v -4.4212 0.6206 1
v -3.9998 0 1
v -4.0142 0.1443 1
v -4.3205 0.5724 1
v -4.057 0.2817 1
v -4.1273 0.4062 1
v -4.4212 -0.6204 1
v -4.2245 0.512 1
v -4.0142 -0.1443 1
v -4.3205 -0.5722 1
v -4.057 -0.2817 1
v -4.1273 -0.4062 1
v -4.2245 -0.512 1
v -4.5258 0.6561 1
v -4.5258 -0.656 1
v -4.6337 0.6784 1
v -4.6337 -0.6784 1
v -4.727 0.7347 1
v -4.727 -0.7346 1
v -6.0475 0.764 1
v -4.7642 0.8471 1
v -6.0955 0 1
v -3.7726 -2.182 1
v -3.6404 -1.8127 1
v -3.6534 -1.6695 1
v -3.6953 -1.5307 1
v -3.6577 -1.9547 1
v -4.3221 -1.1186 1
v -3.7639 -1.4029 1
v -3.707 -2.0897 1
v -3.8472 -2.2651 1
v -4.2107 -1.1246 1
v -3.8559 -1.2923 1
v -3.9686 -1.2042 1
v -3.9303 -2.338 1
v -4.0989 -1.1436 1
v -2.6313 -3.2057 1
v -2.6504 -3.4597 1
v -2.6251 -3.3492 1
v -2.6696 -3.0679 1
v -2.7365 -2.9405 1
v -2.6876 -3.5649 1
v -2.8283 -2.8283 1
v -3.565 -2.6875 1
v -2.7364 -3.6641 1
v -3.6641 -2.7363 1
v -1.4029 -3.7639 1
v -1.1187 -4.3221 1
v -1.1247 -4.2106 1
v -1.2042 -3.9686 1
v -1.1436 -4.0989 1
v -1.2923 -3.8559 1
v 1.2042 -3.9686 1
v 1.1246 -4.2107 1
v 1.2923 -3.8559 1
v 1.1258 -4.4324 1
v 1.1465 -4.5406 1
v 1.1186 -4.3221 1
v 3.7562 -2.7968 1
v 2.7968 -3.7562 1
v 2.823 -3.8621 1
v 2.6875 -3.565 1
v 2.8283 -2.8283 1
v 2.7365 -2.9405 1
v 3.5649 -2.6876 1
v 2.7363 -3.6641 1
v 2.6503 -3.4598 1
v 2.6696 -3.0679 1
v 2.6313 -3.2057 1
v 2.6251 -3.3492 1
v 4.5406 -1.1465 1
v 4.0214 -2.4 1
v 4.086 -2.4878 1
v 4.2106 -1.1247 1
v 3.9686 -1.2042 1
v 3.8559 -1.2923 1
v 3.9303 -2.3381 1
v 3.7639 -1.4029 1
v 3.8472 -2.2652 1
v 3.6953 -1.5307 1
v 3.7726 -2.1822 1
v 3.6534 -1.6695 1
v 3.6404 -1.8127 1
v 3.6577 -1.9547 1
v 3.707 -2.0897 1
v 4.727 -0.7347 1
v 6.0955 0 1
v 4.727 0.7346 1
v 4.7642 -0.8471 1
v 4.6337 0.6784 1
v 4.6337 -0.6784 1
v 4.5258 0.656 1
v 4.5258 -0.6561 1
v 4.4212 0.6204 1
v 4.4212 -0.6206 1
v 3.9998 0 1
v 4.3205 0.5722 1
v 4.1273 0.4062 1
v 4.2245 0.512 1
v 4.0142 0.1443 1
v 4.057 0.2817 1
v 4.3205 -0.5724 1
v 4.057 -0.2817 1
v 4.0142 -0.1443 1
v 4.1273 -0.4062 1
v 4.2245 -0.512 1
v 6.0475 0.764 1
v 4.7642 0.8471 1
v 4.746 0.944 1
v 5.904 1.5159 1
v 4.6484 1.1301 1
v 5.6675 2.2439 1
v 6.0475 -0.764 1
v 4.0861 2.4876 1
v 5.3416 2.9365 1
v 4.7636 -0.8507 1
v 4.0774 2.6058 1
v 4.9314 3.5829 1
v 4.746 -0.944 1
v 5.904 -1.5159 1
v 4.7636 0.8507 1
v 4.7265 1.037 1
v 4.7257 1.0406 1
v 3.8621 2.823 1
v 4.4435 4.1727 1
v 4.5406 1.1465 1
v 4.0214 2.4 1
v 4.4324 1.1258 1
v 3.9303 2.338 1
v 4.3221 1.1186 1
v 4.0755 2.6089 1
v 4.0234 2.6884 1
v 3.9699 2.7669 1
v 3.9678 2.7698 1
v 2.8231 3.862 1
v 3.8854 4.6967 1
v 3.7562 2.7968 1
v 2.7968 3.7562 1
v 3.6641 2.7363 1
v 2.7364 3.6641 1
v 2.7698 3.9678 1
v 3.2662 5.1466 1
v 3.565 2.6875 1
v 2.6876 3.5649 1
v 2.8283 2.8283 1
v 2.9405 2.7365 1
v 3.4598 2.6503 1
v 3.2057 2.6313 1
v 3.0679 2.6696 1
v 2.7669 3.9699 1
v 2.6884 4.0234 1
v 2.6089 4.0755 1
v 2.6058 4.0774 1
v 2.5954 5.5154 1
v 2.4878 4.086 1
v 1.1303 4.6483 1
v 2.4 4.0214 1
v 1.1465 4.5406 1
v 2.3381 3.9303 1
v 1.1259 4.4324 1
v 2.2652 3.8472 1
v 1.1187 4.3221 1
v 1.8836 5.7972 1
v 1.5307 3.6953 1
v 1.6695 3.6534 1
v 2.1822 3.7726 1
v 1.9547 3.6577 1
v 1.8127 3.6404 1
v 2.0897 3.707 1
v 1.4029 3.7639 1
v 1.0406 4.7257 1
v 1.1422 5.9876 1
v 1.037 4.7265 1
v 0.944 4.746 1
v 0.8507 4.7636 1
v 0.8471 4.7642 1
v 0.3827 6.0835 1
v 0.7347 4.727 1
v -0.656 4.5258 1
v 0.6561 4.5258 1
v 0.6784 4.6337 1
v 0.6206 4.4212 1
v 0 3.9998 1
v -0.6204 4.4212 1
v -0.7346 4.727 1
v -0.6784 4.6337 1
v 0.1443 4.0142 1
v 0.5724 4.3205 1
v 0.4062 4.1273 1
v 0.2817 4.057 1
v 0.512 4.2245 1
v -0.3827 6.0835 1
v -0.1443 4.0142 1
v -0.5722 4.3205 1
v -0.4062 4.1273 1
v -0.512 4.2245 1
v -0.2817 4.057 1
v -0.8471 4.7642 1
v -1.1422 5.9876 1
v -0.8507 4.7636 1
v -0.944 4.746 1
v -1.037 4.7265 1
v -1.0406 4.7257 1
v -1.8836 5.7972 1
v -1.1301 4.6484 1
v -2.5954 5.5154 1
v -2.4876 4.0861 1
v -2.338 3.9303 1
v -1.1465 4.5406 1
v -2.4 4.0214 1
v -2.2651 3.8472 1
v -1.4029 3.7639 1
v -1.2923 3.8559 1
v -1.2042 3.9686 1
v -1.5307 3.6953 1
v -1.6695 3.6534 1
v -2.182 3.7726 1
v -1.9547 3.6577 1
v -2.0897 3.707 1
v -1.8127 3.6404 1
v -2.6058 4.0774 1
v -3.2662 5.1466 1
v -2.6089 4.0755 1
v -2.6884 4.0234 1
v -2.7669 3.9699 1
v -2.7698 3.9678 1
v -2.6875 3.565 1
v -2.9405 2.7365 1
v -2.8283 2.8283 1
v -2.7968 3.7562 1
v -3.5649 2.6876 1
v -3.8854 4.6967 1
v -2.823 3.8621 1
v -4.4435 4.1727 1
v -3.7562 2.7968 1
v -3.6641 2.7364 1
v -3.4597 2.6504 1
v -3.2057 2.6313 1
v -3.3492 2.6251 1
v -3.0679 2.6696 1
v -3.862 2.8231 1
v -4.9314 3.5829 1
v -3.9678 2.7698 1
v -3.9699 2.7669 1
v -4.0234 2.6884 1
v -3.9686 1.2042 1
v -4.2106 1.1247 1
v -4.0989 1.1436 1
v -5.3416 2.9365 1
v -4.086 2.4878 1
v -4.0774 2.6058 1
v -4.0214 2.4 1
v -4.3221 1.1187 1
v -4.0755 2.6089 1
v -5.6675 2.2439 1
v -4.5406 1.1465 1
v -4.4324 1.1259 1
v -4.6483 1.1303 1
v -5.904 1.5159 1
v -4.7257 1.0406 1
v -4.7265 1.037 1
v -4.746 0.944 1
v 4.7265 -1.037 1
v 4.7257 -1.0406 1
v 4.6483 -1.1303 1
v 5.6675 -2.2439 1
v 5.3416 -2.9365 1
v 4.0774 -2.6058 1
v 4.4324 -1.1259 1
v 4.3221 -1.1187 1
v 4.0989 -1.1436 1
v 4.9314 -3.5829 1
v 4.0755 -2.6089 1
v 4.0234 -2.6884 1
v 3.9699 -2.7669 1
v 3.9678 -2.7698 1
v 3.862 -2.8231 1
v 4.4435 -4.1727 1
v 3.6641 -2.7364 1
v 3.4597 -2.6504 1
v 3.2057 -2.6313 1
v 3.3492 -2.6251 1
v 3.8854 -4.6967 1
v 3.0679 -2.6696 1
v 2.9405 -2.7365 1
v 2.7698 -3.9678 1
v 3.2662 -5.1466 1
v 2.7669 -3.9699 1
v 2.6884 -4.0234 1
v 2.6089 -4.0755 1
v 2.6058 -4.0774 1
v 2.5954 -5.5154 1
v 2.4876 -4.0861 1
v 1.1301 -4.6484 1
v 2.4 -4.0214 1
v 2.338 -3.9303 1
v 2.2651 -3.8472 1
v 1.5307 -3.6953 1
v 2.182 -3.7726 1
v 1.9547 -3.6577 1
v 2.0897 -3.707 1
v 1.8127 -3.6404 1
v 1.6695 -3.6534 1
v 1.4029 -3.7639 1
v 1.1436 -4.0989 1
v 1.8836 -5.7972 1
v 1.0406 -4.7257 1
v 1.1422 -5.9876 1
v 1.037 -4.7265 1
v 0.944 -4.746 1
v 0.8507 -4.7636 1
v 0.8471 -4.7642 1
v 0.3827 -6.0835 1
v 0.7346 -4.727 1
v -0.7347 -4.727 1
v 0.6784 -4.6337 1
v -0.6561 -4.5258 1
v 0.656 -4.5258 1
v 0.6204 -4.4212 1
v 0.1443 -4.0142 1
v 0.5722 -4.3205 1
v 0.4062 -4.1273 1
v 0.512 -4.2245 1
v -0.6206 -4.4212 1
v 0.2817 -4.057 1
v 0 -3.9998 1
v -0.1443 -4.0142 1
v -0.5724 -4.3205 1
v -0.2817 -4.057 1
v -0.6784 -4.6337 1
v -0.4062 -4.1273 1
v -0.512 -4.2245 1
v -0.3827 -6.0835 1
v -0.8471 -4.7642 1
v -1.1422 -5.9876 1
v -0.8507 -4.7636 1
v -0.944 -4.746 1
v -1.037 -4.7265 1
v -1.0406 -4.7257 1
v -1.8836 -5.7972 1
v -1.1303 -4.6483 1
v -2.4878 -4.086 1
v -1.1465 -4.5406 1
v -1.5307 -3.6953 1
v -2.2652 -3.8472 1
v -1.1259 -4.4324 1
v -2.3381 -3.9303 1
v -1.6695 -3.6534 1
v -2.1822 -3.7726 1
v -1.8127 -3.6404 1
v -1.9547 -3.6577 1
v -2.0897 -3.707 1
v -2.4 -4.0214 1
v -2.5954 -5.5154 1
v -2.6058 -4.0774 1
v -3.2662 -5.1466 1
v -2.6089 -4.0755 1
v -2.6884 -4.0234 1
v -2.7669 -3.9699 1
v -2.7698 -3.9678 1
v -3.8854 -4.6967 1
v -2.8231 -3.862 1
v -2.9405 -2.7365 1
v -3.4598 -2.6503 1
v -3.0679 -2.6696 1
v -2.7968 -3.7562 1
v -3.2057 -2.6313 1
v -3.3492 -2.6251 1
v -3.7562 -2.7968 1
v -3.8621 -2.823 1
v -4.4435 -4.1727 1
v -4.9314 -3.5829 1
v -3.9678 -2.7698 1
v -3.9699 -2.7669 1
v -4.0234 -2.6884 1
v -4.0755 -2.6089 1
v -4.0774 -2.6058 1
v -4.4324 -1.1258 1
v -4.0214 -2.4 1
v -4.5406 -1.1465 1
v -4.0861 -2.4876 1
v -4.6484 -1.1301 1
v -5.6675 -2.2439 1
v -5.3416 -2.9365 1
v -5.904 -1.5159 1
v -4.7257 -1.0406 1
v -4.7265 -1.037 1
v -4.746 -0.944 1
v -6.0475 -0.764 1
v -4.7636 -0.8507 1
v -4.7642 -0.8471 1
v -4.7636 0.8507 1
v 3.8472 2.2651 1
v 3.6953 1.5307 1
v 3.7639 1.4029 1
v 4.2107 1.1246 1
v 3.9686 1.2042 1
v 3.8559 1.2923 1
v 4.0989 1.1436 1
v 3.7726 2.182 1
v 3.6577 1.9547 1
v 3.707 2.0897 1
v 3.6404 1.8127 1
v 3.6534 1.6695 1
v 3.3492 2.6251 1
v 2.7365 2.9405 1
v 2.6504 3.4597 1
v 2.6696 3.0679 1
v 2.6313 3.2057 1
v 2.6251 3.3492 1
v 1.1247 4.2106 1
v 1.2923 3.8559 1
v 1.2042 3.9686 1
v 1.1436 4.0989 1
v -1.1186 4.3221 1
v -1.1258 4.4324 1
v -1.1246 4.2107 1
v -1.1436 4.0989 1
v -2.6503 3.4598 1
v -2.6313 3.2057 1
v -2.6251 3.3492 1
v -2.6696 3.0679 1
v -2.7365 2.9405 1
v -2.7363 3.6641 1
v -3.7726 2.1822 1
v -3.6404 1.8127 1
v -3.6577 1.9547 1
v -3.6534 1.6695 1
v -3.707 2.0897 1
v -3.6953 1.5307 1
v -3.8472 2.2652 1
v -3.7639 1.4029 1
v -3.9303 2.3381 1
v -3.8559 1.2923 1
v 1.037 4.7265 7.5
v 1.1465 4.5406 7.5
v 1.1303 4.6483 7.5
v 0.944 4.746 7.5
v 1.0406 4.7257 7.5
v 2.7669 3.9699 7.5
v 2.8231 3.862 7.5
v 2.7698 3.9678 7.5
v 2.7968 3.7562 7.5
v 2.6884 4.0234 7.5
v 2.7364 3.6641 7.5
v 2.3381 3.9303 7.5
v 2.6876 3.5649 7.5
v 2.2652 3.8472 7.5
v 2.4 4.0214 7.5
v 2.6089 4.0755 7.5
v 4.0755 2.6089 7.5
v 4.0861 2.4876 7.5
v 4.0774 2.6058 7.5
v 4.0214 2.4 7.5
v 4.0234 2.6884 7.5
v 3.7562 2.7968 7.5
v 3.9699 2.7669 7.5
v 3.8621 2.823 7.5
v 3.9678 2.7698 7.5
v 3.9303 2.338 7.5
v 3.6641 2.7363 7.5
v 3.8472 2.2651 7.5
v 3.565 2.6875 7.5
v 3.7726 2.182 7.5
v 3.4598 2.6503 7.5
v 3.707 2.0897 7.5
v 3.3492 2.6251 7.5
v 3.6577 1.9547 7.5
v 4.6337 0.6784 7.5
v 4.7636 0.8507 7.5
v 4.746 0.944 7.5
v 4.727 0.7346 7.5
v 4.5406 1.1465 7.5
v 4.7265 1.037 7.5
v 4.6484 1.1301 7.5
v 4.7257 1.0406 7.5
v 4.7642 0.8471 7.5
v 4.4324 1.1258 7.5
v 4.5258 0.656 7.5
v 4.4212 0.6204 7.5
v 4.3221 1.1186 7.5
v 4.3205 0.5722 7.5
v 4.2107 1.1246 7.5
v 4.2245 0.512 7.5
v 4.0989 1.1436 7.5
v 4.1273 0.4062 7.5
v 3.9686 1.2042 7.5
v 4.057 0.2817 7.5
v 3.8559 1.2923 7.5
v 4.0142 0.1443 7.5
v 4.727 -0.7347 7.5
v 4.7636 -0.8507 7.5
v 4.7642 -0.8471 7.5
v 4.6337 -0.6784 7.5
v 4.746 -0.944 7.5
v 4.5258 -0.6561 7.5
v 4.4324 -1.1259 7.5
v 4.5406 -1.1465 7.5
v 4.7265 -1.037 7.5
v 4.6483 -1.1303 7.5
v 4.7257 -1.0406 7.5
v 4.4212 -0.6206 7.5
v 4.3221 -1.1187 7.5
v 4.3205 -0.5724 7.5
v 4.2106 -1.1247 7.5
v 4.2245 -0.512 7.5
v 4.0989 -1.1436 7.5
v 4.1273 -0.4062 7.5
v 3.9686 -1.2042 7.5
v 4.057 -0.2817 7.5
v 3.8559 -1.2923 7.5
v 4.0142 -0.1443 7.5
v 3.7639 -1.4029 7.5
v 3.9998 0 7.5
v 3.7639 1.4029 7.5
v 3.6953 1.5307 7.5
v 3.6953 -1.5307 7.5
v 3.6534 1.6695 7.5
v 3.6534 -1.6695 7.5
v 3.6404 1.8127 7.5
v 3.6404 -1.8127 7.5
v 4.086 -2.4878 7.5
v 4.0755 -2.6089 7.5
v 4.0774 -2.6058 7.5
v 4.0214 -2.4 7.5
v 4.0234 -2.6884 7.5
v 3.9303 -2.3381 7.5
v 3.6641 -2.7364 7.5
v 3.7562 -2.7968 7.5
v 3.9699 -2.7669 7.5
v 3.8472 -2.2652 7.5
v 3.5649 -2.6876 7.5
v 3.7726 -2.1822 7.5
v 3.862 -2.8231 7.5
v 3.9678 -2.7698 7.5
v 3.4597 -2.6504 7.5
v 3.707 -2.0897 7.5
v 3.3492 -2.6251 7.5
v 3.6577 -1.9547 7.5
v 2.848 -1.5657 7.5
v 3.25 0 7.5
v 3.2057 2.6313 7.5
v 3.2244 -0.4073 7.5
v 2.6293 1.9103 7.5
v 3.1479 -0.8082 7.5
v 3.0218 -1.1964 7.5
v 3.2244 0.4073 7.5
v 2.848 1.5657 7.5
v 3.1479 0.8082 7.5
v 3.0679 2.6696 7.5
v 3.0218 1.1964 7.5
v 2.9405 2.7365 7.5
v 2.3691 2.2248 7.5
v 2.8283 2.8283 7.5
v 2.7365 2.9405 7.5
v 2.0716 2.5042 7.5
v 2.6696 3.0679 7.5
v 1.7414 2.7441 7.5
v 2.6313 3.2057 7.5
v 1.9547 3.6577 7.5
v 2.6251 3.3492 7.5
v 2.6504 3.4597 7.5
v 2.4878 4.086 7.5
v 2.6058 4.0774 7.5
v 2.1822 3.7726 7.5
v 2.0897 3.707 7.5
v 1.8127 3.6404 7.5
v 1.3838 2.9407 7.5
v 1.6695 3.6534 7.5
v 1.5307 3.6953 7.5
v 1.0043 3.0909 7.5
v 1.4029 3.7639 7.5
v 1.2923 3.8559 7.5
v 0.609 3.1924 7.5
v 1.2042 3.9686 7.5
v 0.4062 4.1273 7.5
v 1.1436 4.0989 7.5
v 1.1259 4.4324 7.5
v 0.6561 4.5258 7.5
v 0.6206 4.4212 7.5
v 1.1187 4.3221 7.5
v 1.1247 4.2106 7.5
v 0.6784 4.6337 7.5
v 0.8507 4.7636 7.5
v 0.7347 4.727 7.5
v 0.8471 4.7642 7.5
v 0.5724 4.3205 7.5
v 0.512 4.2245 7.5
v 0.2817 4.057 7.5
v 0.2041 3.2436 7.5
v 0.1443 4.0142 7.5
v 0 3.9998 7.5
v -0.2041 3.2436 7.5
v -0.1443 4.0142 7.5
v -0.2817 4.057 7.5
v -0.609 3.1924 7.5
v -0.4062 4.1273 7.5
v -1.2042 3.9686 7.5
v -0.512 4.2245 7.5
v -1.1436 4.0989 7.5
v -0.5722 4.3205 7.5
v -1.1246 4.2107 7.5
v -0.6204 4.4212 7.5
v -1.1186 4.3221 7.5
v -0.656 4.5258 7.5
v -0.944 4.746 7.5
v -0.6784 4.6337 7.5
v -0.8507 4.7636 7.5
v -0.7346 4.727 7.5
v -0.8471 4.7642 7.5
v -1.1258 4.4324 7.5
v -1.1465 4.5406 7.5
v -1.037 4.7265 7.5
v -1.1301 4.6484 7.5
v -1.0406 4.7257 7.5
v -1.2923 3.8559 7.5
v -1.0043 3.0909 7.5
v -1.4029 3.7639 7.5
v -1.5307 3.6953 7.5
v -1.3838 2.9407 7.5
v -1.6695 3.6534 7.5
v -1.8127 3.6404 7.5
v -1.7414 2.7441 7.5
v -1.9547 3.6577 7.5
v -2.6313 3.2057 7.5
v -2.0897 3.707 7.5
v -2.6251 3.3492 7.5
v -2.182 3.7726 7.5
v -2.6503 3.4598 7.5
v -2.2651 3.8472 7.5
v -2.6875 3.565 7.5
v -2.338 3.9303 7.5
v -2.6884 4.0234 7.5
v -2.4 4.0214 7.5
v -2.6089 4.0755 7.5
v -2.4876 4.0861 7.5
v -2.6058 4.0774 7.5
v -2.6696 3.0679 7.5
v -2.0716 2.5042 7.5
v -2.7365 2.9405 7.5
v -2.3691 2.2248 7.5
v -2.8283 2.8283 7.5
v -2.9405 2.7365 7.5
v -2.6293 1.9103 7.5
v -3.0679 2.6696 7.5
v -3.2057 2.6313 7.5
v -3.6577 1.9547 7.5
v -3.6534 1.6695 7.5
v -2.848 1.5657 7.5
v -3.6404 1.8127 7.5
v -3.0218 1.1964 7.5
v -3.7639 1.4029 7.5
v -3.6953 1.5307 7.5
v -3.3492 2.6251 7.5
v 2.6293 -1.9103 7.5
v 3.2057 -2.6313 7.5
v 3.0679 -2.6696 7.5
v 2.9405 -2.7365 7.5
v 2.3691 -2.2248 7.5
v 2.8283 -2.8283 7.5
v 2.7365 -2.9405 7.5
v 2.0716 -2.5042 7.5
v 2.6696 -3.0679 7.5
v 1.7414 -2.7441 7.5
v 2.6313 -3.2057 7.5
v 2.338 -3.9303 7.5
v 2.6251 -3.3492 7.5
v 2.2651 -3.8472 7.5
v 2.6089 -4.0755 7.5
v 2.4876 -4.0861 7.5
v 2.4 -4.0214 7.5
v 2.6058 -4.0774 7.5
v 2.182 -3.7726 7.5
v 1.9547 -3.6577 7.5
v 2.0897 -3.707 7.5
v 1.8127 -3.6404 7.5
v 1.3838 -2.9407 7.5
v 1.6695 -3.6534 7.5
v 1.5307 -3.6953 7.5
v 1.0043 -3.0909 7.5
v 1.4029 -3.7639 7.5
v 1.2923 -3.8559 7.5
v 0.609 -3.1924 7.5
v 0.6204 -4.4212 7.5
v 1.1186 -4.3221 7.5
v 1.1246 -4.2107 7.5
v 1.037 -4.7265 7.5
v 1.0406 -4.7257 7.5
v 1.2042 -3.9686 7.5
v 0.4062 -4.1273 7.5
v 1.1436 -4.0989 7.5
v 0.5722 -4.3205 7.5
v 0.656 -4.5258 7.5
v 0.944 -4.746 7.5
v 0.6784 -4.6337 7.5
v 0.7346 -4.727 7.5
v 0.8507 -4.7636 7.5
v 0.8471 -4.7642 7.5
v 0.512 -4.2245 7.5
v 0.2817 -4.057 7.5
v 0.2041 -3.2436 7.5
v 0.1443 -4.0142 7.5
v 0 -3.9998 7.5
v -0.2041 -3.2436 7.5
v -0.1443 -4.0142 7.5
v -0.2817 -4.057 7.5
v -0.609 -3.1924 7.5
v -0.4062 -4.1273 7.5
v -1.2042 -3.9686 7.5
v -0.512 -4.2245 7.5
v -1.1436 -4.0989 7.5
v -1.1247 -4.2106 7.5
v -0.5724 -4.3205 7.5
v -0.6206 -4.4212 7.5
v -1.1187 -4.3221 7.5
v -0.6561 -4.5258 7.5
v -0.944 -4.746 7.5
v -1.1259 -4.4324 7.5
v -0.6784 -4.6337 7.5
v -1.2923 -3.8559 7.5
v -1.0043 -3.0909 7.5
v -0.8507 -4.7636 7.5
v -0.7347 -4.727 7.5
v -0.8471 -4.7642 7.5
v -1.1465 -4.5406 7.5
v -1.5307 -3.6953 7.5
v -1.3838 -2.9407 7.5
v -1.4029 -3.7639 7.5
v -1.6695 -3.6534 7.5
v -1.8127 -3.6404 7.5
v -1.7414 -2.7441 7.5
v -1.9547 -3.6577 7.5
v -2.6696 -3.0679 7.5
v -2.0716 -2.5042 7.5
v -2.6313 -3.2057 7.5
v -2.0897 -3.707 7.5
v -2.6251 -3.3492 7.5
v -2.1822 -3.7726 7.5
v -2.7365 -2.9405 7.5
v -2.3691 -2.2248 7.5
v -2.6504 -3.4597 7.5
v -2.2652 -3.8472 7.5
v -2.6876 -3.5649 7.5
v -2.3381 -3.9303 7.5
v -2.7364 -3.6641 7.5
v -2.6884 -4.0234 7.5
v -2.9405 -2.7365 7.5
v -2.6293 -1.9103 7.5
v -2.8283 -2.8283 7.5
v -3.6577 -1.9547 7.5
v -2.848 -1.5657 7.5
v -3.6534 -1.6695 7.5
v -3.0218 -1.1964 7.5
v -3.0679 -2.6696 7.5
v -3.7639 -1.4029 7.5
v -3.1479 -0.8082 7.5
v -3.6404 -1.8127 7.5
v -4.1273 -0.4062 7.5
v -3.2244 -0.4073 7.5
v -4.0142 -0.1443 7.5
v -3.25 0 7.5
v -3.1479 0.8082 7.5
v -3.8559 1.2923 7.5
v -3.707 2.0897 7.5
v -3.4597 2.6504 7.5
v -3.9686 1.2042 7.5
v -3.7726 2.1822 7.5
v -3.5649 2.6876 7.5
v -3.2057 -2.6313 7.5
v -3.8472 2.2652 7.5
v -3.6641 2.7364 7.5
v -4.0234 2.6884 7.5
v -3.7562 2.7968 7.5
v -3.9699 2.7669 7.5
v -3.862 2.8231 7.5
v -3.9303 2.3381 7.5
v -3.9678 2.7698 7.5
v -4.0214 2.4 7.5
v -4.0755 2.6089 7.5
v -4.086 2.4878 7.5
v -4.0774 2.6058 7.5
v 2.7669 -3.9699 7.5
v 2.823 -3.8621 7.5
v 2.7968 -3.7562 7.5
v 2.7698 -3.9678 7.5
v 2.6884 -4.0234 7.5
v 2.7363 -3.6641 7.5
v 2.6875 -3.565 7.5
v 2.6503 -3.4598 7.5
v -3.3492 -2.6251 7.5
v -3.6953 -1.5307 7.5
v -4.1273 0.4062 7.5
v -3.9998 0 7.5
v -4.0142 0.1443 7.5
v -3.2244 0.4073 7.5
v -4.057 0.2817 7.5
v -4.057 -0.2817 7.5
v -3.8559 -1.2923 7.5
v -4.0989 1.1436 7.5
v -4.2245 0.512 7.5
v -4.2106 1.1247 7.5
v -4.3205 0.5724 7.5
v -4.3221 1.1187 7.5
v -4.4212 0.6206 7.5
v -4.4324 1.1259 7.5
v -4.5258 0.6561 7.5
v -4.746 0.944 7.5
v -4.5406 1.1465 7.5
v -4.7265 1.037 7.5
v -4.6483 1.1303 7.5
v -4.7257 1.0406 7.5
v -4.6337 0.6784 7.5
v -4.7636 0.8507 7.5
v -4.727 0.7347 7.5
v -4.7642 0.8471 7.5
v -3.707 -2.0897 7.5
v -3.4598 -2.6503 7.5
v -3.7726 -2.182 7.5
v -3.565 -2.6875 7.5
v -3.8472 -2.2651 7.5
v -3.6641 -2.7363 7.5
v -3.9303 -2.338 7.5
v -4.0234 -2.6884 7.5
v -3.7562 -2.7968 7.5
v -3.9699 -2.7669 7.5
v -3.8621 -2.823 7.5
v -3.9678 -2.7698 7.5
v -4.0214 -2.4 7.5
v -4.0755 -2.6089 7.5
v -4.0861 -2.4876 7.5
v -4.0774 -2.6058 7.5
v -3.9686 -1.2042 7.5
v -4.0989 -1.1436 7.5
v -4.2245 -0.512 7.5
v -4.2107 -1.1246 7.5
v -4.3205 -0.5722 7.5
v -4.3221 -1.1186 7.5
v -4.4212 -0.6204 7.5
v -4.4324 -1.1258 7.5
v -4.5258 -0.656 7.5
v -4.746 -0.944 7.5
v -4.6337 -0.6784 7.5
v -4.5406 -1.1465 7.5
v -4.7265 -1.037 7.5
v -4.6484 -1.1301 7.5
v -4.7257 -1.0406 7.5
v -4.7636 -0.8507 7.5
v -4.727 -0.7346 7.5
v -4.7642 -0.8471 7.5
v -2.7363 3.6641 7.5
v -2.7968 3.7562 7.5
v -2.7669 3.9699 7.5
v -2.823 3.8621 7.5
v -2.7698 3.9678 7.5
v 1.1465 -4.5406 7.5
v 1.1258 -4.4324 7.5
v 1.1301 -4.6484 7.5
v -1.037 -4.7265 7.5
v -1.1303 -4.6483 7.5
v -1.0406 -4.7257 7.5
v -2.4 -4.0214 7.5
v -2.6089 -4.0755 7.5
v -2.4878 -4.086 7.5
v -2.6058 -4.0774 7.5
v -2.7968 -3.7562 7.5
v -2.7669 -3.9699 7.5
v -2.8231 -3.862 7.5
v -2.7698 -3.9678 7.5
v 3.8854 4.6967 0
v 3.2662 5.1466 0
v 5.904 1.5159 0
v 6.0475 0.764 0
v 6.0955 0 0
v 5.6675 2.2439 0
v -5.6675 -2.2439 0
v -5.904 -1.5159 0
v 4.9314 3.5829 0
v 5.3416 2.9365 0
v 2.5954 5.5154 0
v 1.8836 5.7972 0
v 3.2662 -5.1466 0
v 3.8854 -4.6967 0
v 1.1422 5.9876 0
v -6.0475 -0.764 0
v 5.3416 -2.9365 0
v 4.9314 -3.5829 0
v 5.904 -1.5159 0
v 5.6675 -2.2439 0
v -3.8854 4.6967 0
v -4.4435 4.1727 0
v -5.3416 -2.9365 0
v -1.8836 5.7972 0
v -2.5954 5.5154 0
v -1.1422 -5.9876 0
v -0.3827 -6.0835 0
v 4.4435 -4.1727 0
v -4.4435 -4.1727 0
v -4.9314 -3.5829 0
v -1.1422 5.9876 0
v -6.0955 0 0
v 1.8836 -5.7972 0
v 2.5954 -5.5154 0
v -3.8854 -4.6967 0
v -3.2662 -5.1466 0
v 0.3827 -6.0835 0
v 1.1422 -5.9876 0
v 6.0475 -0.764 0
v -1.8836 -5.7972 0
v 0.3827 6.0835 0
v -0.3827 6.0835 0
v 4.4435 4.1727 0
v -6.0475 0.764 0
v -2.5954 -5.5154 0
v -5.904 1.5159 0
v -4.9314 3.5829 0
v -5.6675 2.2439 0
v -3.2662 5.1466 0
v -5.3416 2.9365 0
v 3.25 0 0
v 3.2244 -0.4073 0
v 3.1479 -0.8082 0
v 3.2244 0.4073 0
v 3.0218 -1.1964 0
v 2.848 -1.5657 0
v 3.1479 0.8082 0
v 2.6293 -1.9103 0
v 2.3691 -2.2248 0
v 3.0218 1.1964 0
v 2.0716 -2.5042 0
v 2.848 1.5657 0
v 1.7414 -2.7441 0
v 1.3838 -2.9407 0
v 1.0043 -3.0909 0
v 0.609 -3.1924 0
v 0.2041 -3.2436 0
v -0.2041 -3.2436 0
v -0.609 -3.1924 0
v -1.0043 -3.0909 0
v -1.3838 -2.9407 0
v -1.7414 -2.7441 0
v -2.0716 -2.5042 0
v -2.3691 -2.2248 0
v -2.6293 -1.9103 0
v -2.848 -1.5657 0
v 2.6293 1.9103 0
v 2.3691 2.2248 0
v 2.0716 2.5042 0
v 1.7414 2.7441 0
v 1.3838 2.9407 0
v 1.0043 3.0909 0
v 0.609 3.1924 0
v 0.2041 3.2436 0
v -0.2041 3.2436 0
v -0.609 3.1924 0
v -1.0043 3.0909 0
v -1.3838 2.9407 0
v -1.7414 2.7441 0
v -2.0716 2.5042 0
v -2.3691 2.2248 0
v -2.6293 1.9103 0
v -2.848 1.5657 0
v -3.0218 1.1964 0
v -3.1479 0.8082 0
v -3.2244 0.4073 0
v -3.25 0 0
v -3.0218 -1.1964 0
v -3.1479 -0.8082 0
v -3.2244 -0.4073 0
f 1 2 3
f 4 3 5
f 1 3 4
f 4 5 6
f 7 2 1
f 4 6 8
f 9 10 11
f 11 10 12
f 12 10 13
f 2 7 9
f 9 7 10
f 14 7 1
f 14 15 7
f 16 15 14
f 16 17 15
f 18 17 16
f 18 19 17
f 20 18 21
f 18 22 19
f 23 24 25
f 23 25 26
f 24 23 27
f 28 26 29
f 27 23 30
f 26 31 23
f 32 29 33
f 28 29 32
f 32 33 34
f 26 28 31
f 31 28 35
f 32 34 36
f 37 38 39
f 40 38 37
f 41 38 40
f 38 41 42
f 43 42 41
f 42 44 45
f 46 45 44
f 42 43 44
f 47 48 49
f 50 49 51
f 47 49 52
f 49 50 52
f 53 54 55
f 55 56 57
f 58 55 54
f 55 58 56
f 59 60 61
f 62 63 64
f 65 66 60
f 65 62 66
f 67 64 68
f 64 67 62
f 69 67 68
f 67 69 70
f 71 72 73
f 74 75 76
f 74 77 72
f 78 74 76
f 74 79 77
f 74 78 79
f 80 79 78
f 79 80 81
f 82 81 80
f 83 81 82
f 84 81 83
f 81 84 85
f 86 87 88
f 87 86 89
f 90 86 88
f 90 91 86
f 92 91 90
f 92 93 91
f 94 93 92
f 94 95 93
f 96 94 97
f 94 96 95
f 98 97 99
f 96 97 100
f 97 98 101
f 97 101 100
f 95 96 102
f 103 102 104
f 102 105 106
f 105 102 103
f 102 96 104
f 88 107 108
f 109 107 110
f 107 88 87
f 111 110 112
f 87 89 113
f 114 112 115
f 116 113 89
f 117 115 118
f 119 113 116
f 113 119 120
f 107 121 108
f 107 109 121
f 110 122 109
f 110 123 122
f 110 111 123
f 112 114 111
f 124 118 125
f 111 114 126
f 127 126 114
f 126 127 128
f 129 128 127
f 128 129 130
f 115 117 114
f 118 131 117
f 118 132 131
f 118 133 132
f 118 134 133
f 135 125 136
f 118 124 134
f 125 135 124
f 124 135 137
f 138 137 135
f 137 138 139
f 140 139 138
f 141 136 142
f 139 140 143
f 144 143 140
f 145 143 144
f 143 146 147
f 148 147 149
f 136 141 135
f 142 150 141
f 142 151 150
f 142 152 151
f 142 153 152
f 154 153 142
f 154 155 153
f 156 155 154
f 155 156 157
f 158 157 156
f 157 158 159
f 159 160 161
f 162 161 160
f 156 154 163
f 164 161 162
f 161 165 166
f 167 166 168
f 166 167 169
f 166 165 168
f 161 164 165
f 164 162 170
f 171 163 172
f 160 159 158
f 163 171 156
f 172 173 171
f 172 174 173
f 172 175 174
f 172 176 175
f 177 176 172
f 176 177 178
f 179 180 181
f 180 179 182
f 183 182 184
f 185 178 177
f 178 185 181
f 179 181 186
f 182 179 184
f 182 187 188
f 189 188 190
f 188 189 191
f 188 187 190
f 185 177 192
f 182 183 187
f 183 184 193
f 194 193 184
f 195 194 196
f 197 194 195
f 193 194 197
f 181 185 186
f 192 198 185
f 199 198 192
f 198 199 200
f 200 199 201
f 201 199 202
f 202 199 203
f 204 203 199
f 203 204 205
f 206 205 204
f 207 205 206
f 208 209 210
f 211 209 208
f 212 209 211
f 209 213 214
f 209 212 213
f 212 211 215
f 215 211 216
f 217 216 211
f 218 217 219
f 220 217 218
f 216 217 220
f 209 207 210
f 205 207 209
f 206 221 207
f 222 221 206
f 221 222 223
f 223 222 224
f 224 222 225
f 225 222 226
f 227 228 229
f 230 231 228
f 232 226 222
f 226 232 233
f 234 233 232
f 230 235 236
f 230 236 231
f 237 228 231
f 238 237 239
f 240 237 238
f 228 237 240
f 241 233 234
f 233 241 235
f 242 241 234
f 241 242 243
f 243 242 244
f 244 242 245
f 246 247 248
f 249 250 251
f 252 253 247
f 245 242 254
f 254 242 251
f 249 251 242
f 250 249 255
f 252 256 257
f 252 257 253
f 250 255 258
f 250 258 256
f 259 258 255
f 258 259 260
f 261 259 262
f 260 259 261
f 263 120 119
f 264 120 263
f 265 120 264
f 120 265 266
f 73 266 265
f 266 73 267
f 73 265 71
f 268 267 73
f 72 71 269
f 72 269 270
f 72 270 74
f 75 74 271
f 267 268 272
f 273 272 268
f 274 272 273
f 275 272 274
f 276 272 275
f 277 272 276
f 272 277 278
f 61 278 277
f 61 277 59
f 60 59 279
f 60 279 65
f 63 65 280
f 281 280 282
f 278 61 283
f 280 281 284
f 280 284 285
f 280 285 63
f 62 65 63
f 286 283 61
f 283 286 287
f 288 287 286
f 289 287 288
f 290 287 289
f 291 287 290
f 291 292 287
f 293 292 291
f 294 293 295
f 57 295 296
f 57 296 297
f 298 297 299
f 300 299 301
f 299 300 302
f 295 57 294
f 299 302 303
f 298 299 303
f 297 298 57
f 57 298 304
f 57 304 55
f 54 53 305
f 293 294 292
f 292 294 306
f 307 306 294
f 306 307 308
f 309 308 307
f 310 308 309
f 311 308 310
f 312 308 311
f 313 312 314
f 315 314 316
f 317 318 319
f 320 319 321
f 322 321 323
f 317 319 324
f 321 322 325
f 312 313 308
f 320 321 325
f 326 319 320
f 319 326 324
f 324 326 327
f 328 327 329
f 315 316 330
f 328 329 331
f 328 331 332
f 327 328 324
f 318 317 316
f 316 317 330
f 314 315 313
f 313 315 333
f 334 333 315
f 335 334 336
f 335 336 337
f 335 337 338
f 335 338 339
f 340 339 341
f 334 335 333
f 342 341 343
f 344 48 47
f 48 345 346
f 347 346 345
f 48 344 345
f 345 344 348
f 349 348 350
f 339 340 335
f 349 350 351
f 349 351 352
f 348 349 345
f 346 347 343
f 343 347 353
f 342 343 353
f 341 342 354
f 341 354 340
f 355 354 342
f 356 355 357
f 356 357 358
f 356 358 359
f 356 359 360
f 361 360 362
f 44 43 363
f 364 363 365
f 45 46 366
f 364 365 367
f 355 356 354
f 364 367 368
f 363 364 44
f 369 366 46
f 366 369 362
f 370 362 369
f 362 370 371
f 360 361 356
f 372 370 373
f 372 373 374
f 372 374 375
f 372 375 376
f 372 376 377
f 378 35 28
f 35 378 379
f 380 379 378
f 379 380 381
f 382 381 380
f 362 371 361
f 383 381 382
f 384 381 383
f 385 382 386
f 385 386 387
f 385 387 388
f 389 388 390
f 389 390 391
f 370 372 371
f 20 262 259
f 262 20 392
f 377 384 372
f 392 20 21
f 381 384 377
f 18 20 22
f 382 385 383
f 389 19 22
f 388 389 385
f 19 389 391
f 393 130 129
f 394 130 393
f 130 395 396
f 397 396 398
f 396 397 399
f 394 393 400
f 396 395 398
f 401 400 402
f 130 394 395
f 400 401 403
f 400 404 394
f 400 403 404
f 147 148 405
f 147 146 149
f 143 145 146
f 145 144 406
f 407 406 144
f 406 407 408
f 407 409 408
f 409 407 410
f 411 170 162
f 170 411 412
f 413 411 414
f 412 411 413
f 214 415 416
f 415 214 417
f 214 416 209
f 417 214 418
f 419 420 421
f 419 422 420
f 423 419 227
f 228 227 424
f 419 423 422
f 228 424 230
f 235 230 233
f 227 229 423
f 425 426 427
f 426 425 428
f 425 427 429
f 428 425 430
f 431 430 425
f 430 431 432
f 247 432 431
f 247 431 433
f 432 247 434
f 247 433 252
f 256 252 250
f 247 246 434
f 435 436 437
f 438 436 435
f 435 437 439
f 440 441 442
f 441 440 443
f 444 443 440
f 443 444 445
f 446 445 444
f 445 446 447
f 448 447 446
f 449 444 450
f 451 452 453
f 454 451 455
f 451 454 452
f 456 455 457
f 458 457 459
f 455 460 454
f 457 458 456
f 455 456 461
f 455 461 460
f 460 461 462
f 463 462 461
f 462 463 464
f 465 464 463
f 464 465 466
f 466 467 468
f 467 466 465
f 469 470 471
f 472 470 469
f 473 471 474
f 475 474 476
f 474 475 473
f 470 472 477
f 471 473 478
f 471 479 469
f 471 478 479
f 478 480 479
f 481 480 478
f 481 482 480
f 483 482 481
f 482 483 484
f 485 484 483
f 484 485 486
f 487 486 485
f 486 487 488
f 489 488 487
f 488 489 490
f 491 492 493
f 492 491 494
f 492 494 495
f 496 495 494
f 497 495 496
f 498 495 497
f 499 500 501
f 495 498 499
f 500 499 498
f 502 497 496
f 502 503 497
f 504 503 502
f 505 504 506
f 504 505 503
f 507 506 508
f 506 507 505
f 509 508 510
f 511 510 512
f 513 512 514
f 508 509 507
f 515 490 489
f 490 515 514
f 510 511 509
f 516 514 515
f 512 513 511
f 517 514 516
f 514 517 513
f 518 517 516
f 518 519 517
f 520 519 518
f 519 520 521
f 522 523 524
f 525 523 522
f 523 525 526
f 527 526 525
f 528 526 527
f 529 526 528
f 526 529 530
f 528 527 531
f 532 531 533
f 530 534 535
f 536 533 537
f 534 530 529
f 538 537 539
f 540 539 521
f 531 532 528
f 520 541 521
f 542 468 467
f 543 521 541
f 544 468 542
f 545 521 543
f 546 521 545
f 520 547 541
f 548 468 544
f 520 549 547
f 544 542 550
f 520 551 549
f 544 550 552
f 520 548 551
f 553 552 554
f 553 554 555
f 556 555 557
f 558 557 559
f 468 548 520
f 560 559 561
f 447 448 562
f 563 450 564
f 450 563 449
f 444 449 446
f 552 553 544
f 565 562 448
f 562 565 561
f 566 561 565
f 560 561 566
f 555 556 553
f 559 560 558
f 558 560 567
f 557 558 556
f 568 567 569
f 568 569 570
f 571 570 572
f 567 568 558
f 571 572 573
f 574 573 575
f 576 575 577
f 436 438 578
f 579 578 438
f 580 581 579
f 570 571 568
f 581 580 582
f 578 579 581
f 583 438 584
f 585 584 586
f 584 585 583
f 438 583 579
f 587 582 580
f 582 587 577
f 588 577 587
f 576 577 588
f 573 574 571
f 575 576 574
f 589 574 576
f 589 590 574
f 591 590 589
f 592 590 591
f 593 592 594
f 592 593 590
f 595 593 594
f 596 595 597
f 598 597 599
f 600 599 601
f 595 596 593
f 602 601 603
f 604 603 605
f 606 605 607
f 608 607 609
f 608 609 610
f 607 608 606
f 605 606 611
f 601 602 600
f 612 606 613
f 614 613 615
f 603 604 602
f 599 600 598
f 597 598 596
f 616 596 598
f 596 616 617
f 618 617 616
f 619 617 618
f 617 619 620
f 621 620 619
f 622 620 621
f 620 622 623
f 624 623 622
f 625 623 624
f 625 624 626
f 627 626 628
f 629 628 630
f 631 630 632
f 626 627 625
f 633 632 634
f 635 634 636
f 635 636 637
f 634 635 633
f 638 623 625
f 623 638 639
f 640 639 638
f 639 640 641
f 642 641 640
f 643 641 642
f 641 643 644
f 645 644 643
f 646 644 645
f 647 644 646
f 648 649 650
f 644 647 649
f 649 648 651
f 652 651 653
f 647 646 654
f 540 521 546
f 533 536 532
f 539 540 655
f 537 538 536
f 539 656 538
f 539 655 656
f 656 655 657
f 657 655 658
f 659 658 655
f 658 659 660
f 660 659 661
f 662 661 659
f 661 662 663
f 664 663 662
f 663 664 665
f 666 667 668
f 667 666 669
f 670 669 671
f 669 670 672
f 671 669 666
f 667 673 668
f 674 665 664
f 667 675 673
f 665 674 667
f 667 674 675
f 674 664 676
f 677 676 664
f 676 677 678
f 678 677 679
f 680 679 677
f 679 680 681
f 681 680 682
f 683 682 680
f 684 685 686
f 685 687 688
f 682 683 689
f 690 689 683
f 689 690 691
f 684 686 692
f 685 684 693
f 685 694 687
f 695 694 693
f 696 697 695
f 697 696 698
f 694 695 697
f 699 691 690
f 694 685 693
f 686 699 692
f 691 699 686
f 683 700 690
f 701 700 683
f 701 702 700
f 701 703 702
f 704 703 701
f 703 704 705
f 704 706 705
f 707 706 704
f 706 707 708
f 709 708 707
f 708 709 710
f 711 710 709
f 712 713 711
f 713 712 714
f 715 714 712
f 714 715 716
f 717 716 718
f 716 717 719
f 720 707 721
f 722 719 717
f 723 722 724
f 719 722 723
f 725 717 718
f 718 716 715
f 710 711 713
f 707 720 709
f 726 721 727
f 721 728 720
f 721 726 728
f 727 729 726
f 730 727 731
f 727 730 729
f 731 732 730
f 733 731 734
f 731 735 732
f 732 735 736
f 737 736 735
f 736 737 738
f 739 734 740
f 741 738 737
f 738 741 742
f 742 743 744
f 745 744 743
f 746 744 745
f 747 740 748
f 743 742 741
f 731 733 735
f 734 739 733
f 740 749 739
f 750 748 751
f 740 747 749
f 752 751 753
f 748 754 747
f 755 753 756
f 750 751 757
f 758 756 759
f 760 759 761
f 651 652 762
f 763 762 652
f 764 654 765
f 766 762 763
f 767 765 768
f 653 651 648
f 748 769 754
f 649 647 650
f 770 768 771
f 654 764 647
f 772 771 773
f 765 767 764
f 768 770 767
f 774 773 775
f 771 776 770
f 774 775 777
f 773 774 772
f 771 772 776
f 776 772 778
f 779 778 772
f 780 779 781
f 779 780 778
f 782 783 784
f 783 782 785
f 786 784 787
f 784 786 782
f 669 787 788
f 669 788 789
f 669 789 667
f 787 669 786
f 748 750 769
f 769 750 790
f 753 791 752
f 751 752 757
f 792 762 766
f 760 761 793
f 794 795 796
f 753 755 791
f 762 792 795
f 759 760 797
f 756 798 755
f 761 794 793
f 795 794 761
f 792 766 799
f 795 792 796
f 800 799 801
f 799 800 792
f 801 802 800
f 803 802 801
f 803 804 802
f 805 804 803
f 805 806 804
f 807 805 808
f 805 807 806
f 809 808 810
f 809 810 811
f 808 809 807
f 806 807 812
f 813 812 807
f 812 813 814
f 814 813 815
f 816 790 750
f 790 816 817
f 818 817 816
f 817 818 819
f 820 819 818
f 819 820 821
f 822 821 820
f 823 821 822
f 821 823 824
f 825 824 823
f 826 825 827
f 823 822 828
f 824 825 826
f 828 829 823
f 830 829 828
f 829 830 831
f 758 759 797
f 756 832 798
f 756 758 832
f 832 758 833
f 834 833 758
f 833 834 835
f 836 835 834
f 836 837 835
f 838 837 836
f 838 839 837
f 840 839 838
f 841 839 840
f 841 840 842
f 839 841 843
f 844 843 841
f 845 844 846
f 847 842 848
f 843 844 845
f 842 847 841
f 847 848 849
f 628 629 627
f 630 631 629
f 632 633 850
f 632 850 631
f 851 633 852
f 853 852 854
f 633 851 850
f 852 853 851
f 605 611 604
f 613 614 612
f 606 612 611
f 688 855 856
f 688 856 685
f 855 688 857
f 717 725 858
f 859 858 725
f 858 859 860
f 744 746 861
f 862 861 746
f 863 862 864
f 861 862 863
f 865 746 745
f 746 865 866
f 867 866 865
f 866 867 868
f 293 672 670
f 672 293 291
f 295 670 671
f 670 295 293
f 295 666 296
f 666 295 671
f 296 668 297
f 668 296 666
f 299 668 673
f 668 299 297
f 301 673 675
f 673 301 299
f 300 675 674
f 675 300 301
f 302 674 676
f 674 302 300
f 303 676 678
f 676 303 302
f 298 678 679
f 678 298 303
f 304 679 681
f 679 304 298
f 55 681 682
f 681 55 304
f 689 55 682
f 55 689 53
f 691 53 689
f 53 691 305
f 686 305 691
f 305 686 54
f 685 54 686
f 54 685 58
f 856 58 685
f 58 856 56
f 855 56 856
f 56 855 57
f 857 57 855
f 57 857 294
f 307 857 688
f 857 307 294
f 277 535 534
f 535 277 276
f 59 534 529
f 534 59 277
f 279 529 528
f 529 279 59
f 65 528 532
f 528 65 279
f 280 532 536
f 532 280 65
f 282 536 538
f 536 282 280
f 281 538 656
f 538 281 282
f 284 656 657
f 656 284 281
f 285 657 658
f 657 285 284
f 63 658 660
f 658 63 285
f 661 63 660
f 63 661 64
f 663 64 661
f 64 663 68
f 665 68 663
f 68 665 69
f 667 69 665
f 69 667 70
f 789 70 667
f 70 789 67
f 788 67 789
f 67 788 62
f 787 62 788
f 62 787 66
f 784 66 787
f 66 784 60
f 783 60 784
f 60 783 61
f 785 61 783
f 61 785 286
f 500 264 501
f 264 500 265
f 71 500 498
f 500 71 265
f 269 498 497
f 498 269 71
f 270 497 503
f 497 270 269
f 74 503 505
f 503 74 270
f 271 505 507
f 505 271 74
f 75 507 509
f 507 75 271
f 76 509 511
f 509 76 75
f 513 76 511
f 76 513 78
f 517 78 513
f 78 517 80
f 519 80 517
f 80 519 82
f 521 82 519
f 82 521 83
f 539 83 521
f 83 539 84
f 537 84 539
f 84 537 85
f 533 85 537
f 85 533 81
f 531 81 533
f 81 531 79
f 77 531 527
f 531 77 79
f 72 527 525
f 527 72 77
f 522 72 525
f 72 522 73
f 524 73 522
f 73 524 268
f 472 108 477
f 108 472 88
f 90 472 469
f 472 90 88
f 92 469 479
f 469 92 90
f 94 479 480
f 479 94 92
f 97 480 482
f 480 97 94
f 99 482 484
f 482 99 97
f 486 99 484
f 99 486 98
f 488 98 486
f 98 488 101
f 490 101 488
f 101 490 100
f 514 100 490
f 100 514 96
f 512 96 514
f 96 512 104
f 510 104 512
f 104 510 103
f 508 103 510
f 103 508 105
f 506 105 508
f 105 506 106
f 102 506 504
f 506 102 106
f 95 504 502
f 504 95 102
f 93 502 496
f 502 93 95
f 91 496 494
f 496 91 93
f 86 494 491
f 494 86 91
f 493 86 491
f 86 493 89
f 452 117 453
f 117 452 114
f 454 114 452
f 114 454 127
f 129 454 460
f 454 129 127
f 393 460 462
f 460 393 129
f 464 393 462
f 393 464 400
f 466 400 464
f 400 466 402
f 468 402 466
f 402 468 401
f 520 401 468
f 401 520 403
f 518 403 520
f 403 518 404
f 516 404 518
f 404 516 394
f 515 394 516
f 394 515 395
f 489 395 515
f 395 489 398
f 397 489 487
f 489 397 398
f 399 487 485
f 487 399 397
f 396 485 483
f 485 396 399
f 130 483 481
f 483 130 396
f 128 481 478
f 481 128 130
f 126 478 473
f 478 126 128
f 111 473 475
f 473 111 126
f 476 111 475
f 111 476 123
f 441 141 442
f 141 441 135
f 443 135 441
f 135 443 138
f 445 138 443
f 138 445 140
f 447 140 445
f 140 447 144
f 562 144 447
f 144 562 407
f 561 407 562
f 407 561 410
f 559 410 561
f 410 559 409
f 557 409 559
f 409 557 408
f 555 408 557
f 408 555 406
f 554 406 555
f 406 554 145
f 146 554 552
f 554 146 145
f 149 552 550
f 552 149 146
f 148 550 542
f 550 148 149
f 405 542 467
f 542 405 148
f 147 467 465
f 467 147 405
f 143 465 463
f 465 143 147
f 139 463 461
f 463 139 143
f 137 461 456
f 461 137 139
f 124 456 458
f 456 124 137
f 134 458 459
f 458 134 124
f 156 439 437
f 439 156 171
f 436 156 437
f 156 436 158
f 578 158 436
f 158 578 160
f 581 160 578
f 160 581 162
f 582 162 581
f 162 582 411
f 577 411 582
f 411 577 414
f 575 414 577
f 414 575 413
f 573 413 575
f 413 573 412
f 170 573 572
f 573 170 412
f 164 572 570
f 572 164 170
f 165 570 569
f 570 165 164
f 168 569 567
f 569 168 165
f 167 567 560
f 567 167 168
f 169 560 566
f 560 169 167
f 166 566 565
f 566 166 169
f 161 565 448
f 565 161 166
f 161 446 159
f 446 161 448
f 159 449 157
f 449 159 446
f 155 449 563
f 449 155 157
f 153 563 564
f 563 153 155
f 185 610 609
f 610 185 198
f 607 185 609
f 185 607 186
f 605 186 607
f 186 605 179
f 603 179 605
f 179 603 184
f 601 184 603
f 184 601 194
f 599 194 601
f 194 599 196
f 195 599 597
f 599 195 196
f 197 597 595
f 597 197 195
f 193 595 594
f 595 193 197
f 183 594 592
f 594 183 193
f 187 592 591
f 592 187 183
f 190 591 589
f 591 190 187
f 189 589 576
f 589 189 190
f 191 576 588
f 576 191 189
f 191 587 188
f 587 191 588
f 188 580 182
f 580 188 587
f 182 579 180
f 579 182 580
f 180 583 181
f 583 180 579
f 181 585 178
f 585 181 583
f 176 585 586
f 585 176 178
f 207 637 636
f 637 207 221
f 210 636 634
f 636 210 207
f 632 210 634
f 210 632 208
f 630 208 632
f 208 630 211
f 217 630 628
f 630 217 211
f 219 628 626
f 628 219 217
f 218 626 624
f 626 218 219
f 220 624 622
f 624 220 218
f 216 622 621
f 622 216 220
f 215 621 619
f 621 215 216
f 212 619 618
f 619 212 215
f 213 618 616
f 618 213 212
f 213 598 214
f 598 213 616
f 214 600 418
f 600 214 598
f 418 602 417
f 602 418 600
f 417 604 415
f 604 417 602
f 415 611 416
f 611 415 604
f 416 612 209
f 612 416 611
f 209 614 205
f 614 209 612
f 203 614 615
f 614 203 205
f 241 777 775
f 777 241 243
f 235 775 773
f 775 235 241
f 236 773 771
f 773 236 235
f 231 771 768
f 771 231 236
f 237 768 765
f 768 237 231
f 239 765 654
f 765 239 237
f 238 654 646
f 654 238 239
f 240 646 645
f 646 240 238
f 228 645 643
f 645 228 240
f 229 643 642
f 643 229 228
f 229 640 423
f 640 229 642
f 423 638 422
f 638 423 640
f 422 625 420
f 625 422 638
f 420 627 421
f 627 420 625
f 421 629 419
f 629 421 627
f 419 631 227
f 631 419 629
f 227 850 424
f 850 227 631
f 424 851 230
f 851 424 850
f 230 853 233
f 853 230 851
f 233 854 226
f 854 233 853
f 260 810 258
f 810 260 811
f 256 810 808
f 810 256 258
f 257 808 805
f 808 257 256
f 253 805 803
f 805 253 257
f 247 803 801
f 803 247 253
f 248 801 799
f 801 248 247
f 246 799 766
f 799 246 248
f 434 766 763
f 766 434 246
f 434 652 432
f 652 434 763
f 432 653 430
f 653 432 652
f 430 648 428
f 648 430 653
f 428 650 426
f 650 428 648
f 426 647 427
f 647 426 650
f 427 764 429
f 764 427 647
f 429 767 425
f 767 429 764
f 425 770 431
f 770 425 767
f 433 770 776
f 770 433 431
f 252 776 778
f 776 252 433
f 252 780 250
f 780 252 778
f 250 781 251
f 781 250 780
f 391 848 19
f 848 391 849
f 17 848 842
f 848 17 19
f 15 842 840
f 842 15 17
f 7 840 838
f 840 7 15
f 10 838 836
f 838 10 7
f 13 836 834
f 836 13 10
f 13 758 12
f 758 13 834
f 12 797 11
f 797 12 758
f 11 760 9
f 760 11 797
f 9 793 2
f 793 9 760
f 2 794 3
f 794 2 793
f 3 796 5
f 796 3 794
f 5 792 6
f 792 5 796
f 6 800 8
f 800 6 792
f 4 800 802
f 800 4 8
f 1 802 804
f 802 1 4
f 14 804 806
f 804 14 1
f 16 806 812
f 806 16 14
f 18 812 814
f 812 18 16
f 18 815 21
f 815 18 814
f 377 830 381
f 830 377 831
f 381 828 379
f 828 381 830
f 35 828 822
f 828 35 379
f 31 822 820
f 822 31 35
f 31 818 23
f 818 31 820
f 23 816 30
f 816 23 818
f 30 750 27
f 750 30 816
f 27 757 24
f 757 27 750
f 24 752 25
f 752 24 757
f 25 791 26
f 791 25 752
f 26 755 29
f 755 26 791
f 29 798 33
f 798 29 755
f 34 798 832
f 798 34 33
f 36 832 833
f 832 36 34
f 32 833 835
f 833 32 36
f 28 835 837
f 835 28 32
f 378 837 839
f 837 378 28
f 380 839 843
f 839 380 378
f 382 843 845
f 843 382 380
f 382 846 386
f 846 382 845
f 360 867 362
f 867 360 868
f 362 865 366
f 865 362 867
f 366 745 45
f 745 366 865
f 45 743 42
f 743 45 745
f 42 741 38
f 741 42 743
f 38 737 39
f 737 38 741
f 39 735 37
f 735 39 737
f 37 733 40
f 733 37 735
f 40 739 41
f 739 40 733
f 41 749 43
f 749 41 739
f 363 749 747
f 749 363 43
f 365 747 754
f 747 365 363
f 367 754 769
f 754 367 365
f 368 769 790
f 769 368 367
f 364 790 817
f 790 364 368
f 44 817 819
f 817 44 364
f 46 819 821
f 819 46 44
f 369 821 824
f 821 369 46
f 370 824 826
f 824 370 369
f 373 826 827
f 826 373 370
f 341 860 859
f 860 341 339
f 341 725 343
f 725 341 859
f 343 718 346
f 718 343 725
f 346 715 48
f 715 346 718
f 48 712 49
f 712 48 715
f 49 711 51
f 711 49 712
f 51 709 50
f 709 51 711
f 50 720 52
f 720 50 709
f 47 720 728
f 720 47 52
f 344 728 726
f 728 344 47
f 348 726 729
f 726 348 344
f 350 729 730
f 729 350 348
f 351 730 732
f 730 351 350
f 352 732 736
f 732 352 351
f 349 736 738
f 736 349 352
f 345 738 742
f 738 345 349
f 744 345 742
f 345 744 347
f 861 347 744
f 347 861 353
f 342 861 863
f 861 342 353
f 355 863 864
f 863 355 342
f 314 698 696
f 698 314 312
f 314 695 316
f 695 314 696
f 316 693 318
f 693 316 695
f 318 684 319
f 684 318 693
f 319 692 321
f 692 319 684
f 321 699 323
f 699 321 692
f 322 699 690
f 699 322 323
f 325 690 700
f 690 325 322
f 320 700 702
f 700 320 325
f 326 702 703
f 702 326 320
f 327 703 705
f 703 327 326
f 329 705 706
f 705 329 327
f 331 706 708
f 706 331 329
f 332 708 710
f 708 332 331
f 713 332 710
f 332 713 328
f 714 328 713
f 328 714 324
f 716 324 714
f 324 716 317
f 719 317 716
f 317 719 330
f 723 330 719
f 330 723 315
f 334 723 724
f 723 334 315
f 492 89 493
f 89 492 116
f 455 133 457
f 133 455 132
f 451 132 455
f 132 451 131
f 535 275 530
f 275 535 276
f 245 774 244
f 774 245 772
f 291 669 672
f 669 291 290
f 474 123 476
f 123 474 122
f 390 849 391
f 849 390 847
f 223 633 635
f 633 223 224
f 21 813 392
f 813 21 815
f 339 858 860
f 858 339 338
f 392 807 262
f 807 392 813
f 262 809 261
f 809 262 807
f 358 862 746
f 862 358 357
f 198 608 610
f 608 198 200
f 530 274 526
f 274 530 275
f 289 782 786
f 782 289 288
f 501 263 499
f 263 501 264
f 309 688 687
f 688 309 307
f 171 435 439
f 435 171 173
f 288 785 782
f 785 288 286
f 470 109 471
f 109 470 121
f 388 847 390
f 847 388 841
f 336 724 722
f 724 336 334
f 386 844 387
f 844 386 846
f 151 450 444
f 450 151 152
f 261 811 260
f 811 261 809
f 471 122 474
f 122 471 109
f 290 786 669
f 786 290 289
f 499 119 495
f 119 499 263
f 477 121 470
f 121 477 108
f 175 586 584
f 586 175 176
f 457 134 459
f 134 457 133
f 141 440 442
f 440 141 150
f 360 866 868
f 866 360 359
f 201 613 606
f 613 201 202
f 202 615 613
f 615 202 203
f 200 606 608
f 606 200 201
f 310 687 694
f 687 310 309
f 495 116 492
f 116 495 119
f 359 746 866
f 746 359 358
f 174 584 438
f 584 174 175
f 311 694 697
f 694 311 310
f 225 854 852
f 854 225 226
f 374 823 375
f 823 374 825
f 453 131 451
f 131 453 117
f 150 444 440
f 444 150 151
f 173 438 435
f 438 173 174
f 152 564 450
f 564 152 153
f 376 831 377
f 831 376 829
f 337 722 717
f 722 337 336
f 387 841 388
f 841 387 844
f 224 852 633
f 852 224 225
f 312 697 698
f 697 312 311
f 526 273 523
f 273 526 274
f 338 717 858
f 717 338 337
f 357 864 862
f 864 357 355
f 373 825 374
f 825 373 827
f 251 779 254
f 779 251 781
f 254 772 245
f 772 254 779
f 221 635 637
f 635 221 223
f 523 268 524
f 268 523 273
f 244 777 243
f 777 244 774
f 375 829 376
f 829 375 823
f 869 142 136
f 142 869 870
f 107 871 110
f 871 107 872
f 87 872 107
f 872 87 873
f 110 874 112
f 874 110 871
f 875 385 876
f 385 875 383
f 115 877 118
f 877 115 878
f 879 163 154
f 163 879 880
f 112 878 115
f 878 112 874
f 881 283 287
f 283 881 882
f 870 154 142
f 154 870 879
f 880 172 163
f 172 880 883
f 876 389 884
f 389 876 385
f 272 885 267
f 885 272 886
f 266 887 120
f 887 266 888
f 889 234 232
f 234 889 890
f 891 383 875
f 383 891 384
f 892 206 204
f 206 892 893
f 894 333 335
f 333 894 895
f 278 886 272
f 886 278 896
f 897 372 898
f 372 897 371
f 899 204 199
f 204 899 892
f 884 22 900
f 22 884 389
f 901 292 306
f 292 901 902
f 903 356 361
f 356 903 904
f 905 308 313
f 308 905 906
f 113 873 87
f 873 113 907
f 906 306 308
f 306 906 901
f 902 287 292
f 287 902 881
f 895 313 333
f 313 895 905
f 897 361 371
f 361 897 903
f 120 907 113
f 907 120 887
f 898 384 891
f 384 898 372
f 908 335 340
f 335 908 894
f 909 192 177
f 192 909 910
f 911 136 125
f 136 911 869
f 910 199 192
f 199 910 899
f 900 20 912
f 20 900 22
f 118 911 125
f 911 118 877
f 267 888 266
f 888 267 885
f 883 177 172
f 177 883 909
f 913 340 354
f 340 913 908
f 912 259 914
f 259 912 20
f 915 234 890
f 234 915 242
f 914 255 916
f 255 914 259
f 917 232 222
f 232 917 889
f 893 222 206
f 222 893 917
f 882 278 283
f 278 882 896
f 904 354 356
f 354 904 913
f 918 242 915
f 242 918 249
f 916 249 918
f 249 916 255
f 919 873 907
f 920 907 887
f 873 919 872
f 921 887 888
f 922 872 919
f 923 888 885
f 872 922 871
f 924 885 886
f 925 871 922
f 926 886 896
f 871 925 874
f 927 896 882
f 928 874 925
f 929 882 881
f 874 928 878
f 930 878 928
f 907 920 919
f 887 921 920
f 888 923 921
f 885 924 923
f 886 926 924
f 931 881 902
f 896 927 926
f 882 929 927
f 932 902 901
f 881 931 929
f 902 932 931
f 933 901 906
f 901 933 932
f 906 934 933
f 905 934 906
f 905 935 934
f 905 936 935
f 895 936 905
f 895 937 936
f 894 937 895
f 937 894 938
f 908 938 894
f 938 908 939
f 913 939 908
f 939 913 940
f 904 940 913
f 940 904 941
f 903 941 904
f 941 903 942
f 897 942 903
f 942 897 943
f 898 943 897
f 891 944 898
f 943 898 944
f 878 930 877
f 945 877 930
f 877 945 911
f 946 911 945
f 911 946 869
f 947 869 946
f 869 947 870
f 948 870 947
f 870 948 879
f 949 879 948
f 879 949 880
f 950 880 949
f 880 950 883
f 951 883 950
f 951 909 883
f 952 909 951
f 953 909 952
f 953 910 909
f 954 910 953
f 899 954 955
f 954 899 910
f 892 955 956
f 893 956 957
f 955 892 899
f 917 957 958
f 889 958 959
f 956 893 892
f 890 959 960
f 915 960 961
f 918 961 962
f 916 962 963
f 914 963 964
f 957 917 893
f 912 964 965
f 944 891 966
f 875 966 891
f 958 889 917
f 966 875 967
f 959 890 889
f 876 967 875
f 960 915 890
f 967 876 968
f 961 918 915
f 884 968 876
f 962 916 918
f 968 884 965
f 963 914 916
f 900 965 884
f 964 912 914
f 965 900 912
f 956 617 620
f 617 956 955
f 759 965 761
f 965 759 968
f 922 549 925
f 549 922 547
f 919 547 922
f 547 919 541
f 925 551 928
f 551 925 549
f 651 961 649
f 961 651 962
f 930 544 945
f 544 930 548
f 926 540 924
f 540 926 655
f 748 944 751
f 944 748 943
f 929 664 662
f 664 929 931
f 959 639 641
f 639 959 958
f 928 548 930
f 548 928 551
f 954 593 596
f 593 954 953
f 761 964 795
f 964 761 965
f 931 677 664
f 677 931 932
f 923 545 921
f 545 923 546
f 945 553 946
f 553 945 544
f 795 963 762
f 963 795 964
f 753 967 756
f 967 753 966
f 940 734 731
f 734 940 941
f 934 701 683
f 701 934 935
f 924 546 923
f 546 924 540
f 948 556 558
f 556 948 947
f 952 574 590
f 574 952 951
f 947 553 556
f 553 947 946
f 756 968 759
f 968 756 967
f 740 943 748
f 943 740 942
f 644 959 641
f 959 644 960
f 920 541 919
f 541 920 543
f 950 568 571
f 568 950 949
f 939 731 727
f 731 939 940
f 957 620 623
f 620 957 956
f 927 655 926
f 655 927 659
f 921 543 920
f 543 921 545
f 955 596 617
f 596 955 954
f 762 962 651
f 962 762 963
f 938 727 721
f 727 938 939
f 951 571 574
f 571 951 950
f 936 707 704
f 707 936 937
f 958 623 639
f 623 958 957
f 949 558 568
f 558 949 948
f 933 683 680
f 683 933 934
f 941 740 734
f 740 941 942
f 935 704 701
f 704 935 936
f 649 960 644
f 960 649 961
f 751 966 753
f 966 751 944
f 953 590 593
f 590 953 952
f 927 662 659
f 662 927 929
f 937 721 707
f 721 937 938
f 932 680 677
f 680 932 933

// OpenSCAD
$fn = 50;
use <C:/gh/oomlout_opsc_version_3/pulley_gt2.scad>


difference() {
	union() {
		*color(alpha = 1.0000000000, c = "gray") {
			translate(v = [0, 7, 0]) {
				linear_extrude(height = 1) {
					text(font = "Arial:style=Bold", halign = "center", size = 4.5000000000, text = "COMMENT gear main", valign = "center");
				}
			}
		}
		translate(v = [0, 0, 1]) {
			pulley_gt2(depth = 6.5000000000, number_of_teeth = 16);
		}
		cylinder(h = 1, r = 6.0955414013);
	}
	union() {
		*color(alpha = 1.0000000000, c = "gray") {
			translate(v = [0, 7, 0]) {
				linear_extrude(height = 1) {
					text(font = "Arial:style=Bold", halign = "center", size = 4.5000000000, text = "COMMENT holes main", valign = "center");
				}
			}
		}
		translate(v = [0, 0, -50.0000000000]) {
			cylinder(h = 100, r = 3.2500000000);
		}
	}
}
